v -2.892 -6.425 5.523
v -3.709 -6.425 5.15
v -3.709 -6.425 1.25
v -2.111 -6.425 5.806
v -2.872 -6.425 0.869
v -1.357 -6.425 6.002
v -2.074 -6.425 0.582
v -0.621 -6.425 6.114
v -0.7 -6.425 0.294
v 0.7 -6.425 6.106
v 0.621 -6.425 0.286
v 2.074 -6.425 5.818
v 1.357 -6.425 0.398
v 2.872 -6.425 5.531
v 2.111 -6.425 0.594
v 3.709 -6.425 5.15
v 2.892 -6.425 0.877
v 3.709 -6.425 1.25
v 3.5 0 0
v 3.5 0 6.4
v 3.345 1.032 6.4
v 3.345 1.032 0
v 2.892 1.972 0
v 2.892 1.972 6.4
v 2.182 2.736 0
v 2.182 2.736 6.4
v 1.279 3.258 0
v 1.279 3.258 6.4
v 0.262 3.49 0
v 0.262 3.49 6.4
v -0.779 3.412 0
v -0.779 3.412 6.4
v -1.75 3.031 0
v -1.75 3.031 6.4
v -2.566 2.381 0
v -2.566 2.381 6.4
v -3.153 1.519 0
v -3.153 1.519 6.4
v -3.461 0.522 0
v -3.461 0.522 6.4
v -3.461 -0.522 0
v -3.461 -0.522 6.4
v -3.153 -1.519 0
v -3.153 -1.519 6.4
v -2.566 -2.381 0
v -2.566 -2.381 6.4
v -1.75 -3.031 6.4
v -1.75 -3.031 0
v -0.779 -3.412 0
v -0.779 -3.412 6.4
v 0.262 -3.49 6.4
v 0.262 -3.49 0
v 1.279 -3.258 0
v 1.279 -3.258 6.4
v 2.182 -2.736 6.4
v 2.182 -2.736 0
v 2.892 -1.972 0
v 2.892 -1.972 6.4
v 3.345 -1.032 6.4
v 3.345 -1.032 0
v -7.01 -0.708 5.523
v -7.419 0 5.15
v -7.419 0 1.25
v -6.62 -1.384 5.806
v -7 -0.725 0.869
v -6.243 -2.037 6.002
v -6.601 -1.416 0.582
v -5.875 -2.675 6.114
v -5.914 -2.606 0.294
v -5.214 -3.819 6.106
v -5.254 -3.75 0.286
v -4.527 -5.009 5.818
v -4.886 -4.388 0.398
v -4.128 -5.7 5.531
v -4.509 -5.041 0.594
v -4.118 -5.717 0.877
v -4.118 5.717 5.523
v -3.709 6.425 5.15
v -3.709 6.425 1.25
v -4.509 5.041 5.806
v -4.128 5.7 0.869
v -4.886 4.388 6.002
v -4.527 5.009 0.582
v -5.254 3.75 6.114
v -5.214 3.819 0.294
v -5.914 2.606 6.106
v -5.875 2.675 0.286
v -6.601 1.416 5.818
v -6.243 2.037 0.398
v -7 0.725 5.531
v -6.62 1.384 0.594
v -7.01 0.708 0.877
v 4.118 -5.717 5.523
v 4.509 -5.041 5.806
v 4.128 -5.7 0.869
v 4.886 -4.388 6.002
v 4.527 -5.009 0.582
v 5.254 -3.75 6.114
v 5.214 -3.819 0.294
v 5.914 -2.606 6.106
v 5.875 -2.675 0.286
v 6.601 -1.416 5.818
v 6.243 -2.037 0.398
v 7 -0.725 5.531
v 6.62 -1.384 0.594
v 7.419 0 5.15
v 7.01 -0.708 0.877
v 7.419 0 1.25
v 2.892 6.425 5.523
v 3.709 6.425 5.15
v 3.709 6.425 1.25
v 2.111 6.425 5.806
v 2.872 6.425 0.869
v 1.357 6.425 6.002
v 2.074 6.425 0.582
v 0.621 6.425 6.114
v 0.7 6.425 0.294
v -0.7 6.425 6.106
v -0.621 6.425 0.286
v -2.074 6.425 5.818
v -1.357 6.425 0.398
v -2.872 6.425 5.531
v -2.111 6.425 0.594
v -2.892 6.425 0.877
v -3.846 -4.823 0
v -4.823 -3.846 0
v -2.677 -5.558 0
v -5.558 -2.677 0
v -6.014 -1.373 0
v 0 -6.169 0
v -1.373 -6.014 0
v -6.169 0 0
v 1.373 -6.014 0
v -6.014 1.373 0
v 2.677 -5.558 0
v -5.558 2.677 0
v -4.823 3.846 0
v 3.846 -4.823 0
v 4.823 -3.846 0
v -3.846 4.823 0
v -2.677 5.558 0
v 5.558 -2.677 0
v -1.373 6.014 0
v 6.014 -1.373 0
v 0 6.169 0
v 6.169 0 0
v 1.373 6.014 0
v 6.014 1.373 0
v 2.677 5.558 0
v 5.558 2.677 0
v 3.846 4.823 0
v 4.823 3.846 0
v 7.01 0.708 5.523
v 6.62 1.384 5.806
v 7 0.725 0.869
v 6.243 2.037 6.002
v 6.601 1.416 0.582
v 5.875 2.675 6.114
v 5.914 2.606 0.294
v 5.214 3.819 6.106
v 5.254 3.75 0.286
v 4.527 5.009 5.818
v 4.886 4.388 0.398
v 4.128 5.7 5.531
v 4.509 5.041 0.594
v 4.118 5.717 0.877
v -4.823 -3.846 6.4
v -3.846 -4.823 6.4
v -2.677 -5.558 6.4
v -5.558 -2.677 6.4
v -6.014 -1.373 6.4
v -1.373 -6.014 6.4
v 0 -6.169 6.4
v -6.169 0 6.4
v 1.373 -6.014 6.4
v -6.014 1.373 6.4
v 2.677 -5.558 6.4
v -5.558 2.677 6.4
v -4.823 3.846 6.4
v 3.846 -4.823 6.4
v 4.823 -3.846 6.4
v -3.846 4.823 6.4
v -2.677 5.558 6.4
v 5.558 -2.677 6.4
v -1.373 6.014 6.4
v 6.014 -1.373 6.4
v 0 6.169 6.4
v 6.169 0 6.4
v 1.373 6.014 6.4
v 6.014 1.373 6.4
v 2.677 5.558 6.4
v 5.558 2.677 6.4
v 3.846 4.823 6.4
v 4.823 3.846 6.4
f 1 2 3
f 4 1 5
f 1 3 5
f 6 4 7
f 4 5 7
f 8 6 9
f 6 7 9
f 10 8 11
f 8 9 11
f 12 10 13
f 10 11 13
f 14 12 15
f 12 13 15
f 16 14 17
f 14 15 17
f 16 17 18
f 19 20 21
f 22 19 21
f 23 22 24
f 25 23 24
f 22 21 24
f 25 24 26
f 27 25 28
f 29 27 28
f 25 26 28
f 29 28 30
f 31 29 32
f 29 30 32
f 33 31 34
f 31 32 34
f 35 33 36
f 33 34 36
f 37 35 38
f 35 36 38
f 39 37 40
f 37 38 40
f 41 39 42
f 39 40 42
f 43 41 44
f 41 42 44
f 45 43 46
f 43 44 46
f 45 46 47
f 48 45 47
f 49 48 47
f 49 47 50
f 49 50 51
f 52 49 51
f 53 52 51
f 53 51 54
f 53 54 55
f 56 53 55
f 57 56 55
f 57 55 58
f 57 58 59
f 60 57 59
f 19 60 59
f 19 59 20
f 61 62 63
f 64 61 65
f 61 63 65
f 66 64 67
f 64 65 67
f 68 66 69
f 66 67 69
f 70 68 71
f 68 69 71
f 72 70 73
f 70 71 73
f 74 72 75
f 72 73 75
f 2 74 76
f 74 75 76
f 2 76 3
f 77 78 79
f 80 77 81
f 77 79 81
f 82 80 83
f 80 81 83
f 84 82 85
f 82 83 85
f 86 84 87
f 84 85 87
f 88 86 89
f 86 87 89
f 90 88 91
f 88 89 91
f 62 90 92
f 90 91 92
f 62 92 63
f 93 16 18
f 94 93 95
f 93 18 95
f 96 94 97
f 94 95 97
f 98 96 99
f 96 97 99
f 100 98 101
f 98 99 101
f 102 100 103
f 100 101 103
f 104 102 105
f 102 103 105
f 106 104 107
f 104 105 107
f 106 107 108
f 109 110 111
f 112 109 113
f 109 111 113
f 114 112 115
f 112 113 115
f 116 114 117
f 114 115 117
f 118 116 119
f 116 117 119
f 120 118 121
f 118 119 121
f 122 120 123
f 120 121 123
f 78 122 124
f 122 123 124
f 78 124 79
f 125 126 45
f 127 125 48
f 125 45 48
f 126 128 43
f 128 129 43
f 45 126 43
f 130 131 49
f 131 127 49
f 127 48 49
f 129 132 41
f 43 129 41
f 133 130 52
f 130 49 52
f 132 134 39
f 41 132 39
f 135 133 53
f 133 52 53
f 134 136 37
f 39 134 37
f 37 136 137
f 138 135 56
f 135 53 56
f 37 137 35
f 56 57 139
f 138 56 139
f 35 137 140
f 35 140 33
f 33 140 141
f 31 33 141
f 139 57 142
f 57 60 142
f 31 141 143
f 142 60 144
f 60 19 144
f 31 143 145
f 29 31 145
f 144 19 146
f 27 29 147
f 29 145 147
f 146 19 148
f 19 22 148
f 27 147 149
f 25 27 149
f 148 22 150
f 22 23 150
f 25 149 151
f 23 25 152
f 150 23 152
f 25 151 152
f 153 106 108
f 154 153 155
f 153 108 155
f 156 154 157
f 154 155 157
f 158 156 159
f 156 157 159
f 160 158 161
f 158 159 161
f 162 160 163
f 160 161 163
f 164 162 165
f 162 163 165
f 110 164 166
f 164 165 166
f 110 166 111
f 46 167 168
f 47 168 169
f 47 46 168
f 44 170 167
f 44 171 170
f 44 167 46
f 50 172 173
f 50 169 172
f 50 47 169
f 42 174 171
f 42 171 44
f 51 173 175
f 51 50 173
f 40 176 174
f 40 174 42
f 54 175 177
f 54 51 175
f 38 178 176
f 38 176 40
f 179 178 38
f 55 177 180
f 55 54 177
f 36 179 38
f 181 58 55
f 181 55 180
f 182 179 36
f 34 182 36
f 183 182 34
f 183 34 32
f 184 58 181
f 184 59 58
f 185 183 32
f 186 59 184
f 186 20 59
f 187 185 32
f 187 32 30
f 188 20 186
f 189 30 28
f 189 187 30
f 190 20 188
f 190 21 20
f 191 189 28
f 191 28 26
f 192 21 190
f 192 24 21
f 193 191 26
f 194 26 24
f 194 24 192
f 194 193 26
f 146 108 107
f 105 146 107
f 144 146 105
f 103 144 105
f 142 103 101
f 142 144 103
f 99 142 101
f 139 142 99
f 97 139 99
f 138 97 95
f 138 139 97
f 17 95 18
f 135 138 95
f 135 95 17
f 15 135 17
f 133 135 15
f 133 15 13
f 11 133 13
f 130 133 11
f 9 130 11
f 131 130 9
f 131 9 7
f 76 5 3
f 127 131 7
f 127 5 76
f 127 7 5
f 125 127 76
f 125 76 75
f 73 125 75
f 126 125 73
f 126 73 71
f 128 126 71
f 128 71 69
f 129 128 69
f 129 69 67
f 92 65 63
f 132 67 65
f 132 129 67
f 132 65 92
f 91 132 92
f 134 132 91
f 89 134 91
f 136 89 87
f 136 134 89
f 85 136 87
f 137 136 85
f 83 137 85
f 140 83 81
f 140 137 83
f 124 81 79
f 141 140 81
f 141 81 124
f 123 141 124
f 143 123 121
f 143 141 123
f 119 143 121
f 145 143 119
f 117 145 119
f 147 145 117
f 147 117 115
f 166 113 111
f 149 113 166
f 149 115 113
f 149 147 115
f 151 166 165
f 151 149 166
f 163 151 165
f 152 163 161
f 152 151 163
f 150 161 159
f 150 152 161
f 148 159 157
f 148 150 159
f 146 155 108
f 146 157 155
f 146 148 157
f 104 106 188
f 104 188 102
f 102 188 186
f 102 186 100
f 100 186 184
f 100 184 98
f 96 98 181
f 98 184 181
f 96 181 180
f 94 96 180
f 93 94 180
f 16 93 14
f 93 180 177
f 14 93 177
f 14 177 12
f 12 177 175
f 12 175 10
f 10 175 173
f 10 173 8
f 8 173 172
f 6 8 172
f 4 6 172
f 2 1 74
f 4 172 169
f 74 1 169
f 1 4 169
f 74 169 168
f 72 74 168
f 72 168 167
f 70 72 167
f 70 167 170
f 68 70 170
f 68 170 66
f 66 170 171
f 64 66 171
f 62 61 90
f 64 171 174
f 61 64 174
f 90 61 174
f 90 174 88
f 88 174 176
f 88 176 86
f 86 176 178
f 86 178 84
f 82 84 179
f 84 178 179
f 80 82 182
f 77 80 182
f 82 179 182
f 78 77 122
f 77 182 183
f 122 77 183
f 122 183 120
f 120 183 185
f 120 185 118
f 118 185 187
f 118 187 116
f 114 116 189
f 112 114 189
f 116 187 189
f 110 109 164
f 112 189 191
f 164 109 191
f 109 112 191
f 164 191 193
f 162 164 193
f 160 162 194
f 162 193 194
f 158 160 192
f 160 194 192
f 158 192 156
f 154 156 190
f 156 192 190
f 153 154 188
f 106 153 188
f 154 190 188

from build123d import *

# Parameters (mm, degrees)
BOSS_EXTRUDE1_DEPTH             = 6.4
TAP_DRILL_FOR_M8X1_0_TAP1_D     = 7
TAP_DRILL_FOR_M8X1_0_TAP1_DEPTH = 16


with BuildPart() as part:
    # Sketch1 → Boss-Extrude1 (new body)
    with BuildSketch(Plane.XY):
        Polygon((7.418950959, 0), (3.70947548, 6.425), (-3.70947548, 6.425), (-7.418950959, 0), (-3.70947548, -6.425), (3.70947548, -6.425), align=None)
    extrude(amount=BOSS_EXTRUDE1_DEPTH)

    # Tap Drill for M8x1.0 Tap1
    with Locations(Plane(origin=(0, 0, 0), x_dir=(-1, 0, 0), z_dir=(0, 0, -1))):
        with Locations((0, 0)):
            Hole(TAP_DRILL_FOR_M8X1_0_TAP1_D / 2, depth=TAP_DRILL_FOR_M8X1_0_TAP1_DEPTH)

    # Sketch4 → Cut-Revolve1 (revolve, cut)
    with BuildSketch(Plane(origin=(0, 0, 0), x_dir=(-1, 0, 0), z_dir=(0, -1, 0))):
        Polygon((-7.418950959, 0), (-7.418950959, -1.25), (-6.168950959, 0), align=None)
        Polygon((-7.418950959, -6.4), (-7.418950959, -5.15), (-6.168950959, -6.4), align=None)
    revolve(axis=Axis((0, 0, 6.4), (0, 0, -1)), mode=Mode.SUBTRACT)


solid = part.part
